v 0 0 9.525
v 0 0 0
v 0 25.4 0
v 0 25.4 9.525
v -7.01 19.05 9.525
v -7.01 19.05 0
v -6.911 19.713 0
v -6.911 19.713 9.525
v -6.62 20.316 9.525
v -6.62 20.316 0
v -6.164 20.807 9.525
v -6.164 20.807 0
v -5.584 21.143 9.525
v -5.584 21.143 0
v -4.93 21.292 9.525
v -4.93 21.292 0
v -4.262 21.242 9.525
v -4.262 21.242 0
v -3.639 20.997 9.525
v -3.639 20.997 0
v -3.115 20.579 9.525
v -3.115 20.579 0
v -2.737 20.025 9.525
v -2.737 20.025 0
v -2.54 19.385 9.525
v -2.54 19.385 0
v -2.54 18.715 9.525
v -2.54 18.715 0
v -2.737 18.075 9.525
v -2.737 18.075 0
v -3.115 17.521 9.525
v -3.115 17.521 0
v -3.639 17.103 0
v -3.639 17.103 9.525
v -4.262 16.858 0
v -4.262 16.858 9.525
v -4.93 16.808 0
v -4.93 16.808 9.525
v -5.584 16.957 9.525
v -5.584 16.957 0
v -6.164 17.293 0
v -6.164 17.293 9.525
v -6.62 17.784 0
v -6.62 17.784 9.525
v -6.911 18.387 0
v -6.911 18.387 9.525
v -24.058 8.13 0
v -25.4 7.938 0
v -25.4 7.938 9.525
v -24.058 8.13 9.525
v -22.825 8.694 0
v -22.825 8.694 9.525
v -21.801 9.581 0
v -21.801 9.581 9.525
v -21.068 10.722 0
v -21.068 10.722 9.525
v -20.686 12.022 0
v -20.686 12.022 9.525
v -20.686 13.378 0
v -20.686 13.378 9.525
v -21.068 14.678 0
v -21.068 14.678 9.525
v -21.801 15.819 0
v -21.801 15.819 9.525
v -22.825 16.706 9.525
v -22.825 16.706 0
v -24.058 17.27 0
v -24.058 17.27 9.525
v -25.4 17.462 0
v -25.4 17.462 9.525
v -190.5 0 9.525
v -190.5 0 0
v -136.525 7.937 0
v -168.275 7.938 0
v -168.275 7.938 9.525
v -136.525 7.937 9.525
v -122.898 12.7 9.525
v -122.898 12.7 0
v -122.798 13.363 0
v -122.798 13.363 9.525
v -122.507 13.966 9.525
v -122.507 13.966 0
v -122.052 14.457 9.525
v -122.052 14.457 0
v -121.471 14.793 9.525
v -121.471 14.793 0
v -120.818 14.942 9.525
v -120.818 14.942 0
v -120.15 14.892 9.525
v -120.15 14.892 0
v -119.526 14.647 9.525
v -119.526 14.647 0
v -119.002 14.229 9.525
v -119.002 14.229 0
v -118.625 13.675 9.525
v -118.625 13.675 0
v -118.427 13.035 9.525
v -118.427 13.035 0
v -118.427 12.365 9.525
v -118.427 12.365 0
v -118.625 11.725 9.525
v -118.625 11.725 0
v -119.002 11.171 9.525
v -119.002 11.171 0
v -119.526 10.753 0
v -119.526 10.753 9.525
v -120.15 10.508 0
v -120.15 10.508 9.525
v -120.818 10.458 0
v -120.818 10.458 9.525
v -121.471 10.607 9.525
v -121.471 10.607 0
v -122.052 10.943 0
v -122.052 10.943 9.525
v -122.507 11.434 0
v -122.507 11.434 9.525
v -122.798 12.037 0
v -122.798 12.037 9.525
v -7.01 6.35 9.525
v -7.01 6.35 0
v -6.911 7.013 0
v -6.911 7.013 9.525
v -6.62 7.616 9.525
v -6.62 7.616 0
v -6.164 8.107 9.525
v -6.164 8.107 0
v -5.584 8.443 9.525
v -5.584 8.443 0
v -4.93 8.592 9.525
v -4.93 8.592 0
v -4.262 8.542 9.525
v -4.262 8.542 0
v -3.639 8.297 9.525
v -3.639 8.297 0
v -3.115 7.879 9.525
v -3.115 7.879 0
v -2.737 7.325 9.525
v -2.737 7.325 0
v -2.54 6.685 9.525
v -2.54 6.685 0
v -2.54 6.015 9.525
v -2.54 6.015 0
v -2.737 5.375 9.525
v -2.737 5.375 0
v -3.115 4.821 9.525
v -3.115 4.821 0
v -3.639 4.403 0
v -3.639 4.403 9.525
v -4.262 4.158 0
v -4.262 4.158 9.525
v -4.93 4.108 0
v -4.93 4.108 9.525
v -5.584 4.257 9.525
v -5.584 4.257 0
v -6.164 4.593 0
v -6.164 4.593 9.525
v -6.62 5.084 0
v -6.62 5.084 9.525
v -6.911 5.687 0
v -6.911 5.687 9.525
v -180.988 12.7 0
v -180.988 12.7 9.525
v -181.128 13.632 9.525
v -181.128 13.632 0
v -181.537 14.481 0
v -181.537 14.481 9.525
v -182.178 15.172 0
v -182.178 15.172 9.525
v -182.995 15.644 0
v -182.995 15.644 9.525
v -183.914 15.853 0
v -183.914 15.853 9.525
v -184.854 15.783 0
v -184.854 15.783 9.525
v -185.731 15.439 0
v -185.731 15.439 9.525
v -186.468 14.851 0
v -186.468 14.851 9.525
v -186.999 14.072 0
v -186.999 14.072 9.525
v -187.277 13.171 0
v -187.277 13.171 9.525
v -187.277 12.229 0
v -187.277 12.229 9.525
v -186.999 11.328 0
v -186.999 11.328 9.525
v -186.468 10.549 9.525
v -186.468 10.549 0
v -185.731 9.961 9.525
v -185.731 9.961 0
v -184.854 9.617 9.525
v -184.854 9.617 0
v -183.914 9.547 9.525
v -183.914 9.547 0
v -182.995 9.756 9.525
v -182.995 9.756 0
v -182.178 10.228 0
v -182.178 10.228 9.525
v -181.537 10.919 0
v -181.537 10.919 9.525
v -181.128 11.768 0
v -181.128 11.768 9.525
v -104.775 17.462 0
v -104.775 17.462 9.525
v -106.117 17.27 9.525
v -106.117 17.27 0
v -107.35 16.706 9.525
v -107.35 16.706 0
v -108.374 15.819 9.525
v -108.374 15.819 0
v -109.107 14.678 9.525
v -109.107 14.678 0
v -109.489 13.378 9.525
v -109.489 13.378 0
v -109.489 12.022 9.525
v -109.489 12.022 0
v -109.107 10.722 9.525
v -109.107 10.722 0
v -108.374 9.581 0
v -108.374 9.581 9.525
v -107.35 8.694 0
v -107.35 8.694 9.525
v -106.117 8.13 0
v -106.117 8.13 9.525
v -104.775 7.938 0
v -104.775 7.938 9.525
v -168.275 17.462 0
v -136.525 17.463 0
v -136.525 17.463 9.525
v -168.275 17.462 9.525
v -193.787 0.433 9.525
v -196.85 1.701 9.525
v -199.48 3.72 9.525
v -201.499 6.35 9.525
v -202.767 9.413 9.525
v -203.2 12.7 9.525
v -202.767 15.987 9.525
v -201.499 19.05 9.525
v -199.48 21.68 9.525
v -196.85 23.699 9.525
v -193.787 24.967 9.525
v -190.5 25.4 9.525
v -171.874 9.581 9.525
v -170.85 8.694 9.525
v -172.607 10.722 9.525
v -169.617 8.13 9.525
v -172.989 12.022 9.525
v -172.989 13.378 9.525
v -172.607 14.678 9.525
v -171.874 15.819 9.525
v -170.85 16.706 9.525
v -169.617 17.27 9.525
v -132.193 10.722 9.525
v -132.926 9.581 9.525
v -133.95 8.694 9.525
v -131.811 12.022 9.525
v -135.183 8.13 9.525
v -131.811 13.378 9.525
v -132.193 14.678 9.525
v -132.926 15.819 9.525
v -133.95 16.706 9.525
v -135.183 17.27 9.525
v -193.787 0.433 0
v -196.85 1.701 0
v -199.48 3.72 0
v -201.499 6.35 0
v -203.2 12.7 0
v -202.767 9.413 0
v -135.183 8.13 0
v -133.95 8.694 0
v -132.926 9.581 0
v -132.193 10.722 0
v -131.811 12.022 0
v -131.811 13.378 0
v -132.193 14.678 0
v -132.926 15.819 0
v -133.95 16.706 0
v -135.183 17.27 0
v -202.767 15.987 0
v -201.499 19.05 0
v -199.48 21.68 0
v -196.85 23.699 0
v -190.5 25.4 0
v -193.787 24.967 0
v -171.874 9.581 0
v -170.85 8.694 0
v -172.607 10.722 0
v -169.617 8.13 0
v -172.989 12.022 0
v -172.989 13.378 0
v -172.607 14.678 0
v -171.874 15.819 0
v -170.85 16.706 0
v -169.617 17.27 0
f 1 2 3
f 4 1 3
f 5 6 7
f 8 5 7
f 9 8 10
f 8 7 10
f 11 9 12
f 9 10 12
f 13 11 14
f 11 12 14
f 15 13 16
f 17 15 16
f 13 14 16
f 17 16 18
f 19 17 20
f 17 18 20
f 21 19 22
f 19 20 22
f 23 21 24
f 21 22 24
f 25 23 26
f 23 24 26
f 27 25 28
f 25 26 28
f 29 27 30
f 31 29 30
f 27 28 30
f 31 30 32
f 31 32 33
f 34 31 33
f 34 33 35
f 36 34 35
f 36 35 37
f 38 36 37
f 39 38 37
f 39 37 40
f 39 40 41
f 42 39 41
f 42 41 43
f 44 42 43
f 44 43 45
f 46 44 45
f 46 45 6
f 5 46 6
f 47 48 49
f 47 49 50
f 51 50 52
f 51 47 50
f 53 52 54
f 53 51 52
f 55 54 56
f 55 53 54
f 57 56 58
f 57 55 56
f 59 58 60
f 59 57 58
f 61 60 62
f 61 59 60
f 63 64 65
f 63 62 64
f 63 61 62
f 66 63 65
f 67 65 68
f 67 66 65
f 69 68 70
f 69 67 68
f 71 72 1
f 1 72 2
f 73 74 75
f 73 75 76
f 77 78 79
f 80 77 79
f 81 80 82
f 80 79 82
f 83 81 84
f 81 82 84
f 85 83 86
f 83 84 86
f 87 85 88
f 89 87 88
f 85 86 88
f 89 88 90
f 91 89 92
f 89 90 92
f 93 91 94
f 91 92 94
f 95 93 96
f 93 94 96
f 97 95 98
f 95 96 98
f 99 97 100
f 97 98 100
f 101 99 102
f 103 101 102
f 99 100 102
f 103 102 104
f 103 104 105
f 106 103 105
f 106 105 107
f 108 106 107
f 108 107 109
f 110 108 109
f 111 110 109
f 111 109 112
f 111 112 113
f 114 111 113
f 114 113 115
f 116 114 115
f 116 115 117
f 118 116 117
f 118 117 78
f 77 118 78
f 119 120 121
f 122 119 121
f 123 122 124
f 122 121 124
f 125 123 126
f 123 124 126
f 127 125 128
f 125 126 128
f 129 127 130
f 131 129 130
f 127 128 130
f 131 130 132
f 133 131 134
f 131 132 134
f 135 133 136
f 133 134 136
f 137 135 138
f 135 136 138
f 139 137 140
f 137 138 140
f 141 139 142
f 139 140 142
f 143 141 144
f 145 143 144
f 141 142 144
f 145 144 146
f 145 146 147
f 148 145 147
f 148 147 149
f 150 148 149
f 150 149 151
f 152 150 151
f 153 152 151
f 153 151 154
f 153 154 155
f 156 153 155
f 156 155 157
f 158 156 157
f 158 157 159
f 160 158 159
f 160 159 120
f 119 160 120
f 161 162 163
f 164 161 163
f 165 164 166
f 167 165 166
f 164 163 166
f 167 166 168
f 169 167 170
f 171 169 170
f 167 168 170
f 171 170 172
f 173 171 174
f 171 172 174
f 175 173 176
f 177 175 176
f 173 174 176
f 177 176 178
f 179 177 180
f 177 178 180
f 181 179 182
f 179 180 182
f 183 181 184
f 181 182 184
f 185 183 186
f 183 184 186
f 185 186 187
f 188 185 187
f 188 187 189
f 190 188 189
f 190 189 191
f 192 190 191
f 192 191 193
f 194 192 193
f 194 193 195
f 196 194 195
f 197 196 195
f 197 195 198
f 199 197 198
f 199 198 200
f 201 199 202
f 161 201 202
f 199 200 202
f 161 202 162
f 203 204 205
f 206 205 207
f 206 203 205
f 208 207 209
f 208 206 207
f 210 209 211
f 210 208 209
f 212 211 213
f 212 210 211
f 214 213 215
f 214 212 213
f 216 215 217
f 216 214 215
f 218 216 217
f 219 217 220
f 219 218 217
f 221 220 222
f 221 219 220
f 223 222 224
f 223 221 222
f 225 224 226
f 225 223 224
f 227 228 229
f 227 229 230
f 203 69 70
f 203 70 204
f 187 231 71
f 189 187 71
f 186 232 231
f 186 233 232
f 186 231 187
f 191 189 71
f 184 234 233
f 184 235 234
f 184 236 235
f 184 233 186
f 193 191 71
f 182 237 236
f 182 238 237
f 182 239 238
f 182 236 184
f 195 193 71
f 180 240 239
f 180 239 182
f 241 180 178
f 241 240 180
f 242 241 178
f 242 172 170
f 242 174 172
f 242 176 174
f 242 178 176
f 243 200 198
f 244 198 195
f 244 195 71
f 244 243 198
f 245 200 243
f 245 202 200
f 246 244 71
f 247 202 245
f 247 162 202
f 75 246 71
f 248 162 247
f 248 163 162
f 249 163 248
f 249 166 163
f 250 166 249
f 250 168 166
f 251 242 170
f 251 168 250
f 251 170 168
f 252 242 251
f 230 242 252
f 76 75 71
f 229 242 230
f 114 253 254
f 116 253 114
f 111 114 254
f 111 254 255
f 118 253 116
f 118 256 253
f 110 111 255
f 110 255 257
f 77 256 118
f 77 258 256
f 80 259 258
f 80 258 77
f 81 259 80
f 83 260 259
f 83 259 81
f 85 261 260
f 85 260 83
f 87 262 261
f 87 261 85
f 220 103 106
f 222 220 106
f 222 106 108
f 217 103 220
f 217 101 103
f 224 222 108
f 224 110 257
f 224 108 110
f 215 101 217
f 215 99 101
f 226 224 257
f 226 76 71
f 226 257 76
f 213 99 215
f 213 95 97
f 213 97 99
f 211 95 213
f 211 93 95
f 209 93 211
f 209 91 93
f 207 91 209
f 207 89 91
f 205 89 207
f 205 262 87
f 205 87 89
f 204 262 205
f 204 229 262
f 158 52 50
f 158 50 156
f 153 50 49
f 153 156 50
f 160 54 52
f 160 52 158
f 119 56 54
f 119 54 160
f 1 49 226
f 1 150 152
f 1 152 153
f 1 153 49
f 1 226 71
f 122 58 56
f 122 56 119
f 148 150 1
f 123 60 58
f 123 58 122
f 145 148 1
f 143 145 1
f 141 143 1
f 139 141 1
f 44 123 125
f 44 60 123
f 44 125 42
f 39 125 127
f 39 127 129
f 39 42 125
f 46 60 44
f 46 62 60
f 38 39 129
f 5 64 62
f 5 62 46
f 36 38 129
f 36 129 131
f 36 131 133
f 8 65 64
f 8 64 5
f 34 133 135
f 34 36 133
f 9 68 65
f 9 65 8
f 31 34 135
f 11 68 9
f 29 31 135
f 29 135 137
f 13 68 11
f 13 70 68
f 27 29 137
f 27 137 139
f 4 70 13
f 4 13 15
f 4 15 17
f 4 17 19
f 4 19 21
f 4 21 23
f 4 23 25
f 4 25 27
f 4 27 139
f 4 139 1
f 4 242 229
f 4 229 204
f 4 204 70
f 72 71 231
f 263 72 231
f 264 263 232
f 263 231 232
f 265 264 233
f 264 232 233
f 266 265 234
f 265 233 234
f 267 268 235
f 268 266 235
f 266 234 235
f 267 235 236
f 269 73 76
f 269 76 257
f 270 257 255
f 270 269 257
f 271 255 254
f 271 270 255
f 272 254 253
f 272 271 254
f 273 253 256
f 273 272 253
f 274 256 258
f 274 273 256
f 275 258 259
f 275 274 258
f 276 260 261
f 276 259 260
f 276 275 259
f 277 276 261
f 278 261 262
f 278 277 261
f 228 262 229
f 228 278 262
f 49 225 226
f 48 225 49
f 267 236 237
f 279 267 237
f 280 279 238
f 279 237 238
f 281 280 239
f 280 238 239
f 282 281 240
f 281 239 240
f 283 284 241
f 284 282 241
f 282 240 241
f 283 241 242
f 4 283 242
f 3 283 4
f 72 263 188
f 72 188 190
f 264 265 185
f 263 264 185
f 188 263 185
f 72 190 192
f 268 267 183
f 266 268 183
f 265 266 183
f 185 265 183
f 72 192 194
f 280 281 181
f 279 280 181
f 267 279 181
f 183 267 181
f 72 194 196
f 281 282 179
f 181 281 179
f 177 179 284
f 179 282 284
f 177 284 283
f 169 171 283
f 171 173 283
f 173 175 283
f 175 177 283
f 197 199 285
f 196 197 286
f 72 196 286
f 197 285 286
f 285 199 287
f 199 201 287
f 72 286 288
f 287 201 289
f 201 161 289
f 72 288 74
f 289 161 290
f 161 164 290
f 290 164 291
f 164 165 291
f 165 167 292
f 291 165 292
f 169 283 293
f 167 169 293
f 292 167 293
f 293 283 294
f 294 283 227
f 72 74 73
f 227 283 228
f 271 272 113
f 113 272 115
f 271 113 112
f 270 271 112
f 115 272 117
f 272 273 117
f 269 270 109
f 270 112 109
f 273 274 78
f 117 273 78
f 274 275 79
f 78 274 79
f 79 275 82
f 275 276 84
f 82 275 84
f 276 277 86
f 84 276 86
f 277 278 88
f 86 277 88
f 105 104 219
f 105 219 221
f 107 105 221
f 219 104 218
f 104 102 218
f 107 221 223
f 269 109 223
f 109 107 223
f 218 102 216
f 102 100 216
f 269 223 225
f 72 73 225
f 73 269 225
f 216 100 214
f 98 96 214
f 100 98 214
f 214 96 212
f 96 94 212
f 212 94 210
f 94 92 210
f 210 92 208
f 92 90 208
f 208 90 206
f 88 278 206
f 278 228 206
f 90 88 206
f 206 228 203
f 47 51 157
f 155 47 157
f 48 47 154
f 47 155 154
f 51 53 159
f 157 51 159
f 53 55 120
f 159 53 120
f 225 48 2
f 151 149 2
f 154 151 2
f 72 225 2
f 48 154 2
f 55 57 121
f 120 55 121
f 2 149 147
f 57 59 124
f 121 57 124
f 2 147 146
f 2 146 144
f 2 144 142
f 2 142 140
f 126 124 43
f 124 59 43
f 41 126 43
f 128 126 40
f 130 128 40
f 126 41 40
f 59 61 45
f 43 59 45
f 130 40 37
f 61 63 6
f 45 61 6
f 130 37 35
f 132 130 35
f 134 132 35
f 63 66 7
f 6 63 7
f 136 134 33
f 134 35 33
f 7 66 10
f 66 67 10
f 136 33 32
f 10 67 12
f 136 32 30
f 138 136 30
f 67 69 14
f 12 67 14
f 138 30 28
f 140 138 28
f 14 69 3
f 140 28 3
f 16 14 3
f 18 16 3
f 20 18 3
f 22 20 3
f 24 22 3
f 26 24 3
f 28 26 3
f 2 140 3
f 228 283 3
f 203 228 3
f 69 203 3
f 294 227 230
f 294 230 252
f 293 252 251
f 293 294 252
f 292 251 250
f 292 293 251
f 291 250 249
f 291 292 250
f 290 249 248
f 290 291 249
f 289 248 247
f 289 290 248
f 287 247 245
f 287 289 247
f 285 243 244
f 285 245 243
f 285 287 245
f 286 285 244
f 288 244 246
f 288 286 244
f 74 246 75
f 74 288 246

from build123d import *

# Parameters (mm, degrees)
SKETCH1_W                 = 203.2
SKETCH1_H                 = 25.4
BOSS_EXTRUDE1_DEPTH       = 9.525
F_8_CLEARANCE_HOLE1_D     = 4.4958
F_8_CLEARANCE_HOLE1_DEPTH = 25.4
F_8_CLEARANCE_HOLE1_TIP   = 1.350674586
SKETCH5_R                 = 3.1623
CUT_EXTRUDE1_DEPTH        = 9.525
F_8_CLEARANCE_HOLE2_D     = 4.4958
F_8_CLEARANCE_HOLE2_DEPTH = 19.05
F_8_CLEARANCE_HOLE2_TIP   = 1.350674586
CUT_EXTRUDE2_DEPTH        = 10.525
CUT_EXTRUDE3_DEPTH        = 10.525


with BuildPart() as part:
    # Sketch1 → Boss-Extrude1 (new body)
    with BuildSketch(Plane.XY):
        with Locations((-101.6, 12.7)):
            Rectangle(SKETCH1_W, SKETCH1_H)
    extrude(amount=BOSS_EXTRUDE1_DEPTH)

    # #8 Clearance Hole1
    with Locations(Plane.XY.offset(9.525)):
        with Locations((-4.7625, 6.35), (-4.7625, 19.05)):
            Hole(F_8_CLEARANCE_HOLE1_D / 2, depth=F_8_CLEARANCE_HOLE1_DEPTH)
            with Locations((0, 0, -(F_8_CLEARANCE_HOLE1_DEPTH + F_8_CLEARANCE_HOLE1_TIP / 2))):  # 118° drill point
                Cone(0, F_8_CLEARANCE_HOLE1_D / 2, F_8_CLEARANCE_HOLE1_TIP, mode=Mode.SUBTRACT)

    # Sketch5 → Cut-Extrude1 (cut)
    with BuildSketch(Plane.XY.offset(9.525)):
        with Locations((-184.15, 12.7)):
            Circle(SKETCH5_R)
    extrude(amount=-CUT_EXTRUDE1_DEPTH, mode=Mode.SUBTRACT)

    # #8 Clearance Hole2
    with Locations(Plane.XY.offset(9.525)):
        with Locations((-120.65, 12.7)):
            Hole(F_8_CLEARANCE_HOLE2_D / 2, depth=F_8_CLEARANCE_HOLE2_DEPTH)
            with Locations((0, 0, -(F_8_CLEARANCE_HOLE2_DEPTH + F_8_CLEARANCE_HOLE2_TIP / 2))):  # 118° drill point
                Cone(0, F_8_CLEARANCE_HOLE2_D / 2, F_8_CLEARANCE_HOLE2_TIP, mode=Mode.SUBTRACT)

    # Sketch10 → Cut-Extrude2 (cut, through all)
    with BuildSketch(Plane.XY.offset(9.525)):
        with BuildLine():
            Line((-190.5, 25.4), (-203.2, 25.4))
            Line((-203.2, 25.4), (-203.2, 12.7))
            ThreePointArc((-203.2, 12.7), (-199.480256121, 21.680256121), (-190.5, 25.4))
        make_face()
        with BuildLine():
            ThreePointArc((-190.5, 0), (-199.480256121, 3.719743879), (-203.2, 12.7))
            Line((-203.2, 12.7), (-203.2, 0))
            Line((-203.2, 0), (-190.5, 0))
        make_face()
    extrude(amount=-CUT_EXTRUDE2_DEPTH, mode=Mode.SUBTRACT)

    # Sketch11 → Cut-Extrude3 (cut, through all)
    with BuildSketch(Plane(origin=(0, 0, 0), x_dir=(-1, 0, 0), z_dir=(0, 0, -1))):
        with BuildLine():
            Line((25.4, 17.4625), (104.775, 17.4625))
            ThreePointArc((104.775, 17.4625), (109.5375, 12.7), (104.775, 7.9375))
            Line((104.775, 7.9375), (25.4, 7.9375))
            ThreePointArc((25.4, 7.9375), (20.6375, 12.7), (25.4, 17.4625))
        make_face()
        with BuildLine():
            Line((136.525, 17.4625), (168.275, 17.4625))
            ThreePointArc((168.275, 17.4625), (173.0375, 12.7), (168.275, 7.9375))
            Line((168.275, 7.9375), (136.525, 7.9375))
            ThreePointArc((136.525, 7.9375), (131.7625, 12.7), (136.525, 17.4625))
        make_face()
    extrude(amount=-CUT_EXTRUDE3_DEPTH, mode=Mode.SUBTRACT)


solid = part.part
